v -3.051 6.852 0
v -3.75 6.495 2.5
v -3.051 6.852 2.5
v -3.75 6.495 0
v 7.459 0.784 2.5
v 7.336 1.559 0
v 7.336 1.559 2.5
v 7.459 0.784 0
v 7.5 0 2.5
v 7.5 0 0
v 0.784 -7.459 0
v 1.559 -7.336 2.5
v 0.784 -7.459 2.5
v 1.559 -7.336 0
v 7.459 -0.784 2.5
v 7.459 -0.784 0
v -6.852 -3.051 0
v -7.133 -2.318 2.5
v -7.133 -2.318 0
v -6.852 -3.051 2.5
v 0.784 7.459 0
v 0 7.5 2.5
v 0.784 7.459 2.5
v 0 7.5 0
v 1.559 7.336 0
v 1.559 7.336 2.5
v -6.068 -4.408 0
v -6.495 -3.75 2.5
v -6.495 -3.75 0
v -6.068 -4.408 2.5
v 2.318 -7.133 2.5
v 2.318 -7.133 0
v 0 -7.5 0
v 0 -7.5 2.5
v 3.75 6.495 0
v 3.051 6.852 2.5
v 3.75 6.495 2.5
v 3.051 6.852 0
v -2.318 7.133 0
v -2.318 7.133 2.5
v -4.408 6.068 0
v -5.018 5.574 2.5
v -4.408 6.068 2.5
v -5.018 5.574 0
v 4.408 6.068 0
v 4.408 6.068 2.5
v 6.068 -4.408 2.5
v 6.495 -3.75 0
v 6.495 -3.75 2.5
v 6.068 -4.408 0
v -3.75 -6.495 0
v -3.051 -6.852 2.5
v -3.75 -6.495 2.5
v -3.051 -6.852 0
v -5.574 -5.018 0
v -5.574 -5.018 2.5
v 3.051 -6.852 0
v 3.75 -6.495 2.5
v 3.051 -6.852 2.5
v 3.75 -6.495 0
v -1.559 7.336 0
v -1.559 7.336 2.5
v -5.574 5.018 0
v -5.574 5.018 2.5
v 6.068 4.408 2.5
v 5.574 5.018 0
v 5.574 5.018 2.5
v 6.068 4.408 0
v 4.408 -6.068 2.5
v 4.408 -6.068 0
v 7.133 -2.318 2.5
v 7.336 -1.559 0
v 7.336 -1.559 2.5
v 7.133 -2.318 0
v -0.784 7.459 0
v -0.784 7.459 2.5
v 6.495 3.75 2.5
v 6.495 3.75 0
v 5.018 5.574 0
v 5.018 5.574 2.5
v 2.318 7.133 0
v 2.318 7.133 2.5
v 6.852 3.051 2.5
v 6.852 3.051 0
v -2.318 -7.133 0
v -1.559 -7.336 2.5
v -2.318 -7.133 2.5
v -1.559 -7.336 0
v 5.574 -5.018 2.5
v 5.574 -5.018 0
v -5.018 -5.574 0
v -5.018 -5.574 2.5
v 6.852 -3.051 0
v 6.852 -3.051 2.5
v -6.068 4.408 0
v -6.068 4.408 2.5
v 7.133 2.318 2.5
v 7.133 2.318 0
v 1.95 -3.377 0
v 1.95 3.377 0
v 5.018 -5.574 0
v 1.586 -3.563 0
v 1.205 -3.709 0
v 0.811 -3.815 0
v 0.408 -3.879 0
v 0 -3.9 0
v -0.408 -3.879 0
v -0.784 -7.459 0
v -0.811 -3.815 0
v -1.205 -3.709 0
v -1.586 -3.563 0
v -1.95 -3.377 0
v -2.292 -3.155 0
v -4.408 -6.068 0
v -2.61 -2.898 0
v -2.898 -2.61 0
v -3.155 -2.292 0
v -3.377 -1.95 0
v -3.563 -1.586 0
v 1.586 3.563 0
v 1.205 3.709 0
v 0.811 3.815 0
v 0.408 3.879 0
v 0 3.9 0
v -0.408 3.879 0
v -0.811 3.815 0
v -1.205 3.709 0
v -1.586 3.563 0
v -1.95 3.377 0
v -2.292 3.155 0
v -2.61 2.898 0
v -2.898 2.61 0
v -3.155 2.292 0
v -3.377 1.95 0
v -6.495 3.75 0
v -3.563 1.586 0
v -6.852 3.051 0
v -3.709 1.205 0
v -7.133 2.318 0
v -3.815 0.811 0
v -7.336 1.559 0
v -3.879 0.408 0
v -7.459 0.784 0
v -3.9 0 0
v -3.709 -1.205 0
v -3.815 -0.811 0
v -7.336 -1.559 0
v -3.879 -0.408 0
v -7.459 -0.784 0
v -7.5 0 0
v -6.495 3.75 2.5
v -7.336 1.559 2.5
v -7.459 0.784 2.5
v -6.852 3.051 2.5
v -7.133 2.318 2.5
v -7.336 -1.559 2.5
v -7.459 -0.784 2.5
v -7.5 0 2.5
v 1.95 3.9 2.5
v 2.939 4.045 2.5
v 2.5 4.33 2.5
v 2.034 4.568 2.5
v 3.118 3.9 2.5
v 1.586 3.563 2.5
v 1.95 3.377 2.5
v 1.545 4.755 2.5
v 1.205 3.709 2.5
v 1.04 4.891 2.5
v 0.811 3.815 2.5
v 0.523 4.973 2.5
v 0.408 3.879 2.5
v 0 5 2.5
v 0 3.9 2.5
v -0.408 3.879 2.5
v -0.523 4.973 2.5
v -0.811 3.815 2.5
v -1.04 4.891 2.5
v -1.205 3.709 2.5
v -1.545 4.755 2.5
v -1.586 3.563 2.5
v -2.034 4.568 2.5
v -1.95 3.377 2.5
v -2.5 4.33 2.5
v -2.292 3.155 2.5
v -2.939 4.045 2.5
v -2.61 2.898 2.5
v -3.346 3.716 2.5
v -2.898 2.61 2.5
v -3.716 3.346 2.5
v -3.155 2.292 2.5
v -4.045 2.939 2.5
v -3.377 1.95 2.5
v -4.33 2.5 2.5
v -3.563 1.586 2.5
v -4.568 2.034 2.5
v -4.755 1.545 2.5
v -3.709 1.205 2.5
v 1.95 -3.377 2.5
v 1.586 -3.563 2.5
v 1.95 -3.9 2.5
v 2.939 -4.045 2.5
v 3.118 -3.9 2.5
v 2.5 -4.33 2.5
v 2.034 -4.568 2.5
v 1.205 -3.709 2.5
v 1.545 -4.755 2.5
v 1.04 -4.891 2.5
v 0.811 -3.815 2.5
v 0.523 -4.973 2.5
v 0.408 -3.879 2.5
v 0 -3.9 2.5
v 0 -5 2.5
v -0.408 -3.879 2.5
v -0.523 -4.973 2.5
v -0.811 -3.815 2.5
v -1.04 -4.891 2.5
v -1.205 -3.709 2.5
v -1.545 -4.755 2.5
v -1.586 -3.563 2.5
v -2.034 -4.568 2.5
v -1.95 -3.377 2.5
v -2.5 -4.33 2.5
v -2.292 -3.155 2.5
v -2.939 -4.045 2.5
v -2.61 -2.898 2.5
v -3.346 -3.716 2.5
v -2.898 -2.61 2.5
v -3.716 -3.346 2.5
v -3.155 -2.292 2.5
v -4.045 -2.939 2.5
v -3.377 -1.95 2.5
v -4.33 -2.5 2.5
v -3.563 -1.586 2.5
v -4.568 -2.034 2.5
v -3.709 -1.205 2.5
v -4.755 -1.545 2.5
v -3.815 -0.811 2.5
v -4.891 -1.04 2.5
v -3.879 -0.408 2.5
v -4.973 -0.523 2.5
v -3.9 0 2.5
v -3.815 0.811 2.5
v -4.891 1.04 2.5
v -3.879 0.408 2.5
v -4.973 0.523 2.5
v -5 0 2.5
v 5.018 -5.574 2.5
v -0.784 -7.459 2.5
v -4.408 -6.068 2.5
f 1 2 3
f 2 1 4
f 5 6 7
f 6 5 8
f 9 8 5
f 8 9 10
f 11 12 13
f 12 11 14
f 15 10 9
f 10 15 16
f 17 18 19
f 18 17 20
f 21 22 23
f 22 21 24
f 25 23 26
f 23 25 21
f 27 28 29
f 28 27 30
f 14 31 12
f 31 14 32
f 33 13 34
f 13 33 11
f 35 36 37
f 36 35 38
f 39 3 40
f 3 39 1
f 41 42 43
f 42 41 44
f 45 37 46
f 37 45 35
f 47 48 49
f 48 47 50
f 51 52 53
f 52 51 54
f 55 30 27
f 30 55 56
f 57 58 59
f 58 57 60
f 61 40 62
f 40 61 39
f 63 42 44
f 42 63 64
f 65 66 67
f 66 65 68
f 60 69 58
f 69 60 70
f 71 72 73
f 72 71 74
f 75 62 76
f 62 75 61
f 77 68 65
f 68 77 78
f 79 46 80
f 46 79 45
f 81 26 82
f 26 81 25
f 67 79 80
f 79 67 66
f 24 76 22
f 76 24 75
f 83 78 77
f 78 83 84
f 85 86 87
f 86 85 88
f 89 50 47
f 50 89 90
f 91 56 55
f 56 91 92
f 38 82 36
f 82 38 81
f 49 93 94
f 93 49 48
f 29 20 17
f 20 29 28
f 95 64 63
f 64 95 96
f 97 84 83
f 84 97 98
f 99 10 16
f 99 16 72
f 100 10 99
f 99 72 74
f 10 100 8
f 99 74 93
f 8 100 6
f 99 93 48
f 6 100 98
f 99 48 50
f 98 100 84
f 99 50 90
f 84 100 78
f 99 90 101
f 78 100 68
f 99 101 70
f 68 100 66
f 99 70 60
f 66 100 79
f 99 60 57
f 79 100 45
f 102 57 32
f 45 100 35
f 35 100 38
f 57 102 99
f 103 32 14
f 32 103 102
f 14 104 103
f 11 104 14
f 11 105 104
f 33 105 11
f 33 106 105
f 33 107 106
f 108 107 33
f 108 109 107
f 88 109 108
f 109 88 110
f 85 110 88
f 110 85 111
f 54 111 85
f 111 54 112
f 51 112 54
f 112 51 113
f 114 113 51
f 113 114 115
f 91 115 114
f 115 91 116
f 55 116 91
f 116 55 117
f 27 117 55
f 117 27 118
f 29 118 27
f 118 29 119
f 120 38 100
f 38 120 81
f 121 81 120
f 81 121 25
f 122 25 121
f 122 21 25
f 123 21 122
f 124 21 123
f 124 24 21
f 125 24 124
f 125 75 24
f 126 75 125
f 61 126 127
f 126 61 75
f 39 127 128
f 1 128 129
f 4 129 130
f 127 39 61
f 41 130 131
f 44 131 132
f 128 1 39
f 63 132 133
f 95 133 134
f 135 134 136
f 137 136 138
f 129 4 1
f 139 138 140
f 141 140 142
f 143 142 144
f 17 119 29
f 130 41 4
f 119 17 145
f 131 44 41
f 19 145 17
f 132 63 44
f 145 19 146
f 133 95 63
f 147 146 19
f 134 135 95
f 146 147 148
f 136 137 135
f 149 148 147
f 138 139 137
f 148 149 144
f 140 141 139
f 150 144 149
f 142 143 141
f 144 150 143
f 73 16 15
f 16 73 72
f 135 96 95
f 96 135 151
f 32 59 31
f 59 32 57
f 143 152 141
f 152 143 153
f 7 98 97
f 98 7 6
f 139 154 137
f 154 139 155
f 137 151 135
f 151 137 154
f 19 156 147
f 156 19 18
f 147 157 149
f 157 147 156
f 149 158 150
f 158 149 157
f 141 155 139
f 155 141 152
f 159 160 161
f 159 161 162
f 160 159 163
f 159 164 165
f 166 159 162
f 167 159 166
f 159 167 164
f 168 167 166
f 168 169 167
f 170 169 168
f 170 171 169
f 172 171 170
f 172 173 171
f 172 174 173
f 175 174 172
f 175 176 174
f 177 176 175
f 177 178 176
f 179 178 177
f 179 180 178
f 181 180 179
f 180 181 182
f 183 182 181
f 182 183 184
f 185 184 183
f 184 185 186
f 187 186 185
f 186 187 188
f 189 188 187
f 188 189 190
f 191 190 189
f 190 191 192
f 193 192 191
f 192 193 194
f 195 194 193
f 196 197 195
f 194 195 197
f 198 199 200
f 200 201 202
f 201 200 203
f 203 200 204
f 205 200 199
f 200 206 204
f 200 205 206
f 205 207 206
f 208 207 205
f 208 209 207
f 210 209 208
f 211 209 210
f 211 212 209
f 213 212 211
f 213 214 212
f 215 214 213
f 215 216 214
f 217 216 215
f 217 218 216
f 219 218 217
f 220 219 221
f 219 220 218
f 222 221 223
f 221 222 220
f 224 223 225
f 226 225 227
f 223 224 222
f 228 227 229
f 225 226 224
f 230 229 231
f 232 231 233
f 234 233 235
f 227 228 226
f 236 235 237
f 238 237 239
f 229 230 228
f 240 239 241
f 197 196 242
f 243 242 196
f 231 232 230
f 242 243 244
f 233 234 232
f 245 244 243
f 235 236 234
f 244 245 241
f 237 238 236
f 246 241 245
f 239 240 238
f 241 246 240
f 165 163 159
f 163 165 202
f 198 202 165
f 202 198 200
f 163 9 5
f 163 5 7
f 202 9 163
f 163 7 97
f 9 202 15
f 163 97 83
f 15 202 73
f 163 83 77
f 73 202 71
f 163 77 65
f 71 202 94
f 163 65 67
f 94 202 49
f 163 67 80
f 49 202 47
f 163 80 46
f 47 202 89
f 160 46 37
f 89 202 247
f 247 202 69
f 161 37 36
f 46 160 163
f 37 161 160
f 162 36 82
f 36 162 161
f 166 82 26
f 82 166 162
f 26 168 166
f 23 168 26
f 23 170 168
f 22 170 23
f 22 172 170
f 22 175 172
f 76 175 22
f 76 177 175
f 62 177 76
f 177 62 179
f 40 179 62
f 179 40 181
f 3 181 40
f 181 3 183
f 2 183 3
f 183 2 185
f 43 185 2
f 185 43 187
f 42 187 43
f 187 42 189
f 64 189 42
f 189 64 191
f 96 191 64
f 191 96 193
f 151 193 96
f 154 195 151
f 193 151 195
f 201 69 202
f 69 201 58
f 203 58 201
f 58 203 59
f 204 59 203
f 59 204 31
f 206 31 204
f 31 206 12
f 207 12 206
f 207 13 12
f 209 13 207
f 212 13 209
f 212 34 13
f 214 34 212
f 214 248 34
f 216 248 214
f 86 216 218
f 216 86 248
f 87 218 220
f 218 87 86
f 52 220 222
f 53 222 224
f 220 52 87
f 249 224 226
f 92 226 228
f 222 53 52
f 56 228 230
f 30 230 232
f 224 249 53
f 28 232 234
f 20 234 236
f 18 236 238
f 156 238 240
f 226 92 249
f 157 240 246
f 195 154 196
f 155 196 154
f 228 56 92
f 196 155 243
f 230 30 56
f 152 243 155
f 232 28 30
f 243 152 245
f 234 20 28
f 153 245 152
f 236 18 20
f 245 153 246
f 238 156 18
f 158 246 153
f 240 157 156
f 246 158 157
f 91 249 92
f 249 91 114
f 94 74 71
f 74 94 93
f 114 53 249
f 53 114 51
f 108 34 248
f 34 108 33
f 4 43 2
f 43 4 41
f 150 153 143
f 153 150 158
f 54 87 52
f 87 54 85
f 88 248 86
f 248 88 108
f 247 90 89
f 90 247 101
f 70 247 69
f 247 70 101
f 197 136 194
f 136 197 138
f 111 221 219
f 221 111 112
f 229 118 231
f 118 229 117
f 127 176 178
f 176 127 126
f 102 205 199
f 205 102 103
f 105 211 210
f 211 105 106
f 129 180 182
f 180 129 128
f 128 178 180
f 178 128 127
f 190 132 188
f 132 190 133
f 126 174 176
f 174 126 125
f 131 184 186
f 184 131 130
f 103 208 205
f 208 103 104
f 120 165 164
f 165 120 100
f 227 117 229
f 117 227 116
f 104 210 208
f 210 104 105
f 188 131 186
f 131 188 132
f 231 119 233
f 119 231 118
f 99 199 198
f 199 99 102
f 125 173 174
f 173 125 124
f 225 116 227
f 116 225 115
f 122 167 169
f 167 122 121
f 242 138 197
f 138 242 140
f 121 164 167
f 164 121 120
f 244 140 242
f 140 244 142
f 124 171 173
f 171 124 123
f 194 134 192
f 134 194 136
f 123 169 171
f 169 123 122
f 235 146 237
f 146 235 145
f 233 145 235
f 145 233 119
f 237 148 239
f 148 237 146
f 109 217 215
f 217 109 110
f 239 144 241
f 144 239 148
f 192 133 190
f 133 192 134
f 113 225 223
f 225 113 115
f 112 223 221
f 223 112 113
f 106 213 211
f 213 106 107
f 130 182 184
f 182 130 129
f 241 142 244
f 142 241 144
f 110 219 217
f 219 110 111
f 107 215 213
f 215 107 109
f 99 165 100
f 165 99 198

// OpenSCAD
// robot wheel for gear motors
$fn = 60;
diameter = 15;
rim_thickness = 2.5;
rim_diameter = 5; // subtracted from total diameter
disc_thickness = 2.5; 

// 4mm with cutout at 2 works but is sloppy
union(){
difference(){
cylinder(h = rim_thickness, r = diameter/2);
translate([0,0,disc_thickness])
    cylinder(h = disc_thickness, r = (diameter-rim_diameter)/2);
    
cylinder(h = disc_thickness, r = 3.9); //this size fits perfectly, sliding on with nearly no slop
}
translate([(3.9/2), -3.9, 0])
    cube([3.9, 7.8, disc_thickness]);
}
